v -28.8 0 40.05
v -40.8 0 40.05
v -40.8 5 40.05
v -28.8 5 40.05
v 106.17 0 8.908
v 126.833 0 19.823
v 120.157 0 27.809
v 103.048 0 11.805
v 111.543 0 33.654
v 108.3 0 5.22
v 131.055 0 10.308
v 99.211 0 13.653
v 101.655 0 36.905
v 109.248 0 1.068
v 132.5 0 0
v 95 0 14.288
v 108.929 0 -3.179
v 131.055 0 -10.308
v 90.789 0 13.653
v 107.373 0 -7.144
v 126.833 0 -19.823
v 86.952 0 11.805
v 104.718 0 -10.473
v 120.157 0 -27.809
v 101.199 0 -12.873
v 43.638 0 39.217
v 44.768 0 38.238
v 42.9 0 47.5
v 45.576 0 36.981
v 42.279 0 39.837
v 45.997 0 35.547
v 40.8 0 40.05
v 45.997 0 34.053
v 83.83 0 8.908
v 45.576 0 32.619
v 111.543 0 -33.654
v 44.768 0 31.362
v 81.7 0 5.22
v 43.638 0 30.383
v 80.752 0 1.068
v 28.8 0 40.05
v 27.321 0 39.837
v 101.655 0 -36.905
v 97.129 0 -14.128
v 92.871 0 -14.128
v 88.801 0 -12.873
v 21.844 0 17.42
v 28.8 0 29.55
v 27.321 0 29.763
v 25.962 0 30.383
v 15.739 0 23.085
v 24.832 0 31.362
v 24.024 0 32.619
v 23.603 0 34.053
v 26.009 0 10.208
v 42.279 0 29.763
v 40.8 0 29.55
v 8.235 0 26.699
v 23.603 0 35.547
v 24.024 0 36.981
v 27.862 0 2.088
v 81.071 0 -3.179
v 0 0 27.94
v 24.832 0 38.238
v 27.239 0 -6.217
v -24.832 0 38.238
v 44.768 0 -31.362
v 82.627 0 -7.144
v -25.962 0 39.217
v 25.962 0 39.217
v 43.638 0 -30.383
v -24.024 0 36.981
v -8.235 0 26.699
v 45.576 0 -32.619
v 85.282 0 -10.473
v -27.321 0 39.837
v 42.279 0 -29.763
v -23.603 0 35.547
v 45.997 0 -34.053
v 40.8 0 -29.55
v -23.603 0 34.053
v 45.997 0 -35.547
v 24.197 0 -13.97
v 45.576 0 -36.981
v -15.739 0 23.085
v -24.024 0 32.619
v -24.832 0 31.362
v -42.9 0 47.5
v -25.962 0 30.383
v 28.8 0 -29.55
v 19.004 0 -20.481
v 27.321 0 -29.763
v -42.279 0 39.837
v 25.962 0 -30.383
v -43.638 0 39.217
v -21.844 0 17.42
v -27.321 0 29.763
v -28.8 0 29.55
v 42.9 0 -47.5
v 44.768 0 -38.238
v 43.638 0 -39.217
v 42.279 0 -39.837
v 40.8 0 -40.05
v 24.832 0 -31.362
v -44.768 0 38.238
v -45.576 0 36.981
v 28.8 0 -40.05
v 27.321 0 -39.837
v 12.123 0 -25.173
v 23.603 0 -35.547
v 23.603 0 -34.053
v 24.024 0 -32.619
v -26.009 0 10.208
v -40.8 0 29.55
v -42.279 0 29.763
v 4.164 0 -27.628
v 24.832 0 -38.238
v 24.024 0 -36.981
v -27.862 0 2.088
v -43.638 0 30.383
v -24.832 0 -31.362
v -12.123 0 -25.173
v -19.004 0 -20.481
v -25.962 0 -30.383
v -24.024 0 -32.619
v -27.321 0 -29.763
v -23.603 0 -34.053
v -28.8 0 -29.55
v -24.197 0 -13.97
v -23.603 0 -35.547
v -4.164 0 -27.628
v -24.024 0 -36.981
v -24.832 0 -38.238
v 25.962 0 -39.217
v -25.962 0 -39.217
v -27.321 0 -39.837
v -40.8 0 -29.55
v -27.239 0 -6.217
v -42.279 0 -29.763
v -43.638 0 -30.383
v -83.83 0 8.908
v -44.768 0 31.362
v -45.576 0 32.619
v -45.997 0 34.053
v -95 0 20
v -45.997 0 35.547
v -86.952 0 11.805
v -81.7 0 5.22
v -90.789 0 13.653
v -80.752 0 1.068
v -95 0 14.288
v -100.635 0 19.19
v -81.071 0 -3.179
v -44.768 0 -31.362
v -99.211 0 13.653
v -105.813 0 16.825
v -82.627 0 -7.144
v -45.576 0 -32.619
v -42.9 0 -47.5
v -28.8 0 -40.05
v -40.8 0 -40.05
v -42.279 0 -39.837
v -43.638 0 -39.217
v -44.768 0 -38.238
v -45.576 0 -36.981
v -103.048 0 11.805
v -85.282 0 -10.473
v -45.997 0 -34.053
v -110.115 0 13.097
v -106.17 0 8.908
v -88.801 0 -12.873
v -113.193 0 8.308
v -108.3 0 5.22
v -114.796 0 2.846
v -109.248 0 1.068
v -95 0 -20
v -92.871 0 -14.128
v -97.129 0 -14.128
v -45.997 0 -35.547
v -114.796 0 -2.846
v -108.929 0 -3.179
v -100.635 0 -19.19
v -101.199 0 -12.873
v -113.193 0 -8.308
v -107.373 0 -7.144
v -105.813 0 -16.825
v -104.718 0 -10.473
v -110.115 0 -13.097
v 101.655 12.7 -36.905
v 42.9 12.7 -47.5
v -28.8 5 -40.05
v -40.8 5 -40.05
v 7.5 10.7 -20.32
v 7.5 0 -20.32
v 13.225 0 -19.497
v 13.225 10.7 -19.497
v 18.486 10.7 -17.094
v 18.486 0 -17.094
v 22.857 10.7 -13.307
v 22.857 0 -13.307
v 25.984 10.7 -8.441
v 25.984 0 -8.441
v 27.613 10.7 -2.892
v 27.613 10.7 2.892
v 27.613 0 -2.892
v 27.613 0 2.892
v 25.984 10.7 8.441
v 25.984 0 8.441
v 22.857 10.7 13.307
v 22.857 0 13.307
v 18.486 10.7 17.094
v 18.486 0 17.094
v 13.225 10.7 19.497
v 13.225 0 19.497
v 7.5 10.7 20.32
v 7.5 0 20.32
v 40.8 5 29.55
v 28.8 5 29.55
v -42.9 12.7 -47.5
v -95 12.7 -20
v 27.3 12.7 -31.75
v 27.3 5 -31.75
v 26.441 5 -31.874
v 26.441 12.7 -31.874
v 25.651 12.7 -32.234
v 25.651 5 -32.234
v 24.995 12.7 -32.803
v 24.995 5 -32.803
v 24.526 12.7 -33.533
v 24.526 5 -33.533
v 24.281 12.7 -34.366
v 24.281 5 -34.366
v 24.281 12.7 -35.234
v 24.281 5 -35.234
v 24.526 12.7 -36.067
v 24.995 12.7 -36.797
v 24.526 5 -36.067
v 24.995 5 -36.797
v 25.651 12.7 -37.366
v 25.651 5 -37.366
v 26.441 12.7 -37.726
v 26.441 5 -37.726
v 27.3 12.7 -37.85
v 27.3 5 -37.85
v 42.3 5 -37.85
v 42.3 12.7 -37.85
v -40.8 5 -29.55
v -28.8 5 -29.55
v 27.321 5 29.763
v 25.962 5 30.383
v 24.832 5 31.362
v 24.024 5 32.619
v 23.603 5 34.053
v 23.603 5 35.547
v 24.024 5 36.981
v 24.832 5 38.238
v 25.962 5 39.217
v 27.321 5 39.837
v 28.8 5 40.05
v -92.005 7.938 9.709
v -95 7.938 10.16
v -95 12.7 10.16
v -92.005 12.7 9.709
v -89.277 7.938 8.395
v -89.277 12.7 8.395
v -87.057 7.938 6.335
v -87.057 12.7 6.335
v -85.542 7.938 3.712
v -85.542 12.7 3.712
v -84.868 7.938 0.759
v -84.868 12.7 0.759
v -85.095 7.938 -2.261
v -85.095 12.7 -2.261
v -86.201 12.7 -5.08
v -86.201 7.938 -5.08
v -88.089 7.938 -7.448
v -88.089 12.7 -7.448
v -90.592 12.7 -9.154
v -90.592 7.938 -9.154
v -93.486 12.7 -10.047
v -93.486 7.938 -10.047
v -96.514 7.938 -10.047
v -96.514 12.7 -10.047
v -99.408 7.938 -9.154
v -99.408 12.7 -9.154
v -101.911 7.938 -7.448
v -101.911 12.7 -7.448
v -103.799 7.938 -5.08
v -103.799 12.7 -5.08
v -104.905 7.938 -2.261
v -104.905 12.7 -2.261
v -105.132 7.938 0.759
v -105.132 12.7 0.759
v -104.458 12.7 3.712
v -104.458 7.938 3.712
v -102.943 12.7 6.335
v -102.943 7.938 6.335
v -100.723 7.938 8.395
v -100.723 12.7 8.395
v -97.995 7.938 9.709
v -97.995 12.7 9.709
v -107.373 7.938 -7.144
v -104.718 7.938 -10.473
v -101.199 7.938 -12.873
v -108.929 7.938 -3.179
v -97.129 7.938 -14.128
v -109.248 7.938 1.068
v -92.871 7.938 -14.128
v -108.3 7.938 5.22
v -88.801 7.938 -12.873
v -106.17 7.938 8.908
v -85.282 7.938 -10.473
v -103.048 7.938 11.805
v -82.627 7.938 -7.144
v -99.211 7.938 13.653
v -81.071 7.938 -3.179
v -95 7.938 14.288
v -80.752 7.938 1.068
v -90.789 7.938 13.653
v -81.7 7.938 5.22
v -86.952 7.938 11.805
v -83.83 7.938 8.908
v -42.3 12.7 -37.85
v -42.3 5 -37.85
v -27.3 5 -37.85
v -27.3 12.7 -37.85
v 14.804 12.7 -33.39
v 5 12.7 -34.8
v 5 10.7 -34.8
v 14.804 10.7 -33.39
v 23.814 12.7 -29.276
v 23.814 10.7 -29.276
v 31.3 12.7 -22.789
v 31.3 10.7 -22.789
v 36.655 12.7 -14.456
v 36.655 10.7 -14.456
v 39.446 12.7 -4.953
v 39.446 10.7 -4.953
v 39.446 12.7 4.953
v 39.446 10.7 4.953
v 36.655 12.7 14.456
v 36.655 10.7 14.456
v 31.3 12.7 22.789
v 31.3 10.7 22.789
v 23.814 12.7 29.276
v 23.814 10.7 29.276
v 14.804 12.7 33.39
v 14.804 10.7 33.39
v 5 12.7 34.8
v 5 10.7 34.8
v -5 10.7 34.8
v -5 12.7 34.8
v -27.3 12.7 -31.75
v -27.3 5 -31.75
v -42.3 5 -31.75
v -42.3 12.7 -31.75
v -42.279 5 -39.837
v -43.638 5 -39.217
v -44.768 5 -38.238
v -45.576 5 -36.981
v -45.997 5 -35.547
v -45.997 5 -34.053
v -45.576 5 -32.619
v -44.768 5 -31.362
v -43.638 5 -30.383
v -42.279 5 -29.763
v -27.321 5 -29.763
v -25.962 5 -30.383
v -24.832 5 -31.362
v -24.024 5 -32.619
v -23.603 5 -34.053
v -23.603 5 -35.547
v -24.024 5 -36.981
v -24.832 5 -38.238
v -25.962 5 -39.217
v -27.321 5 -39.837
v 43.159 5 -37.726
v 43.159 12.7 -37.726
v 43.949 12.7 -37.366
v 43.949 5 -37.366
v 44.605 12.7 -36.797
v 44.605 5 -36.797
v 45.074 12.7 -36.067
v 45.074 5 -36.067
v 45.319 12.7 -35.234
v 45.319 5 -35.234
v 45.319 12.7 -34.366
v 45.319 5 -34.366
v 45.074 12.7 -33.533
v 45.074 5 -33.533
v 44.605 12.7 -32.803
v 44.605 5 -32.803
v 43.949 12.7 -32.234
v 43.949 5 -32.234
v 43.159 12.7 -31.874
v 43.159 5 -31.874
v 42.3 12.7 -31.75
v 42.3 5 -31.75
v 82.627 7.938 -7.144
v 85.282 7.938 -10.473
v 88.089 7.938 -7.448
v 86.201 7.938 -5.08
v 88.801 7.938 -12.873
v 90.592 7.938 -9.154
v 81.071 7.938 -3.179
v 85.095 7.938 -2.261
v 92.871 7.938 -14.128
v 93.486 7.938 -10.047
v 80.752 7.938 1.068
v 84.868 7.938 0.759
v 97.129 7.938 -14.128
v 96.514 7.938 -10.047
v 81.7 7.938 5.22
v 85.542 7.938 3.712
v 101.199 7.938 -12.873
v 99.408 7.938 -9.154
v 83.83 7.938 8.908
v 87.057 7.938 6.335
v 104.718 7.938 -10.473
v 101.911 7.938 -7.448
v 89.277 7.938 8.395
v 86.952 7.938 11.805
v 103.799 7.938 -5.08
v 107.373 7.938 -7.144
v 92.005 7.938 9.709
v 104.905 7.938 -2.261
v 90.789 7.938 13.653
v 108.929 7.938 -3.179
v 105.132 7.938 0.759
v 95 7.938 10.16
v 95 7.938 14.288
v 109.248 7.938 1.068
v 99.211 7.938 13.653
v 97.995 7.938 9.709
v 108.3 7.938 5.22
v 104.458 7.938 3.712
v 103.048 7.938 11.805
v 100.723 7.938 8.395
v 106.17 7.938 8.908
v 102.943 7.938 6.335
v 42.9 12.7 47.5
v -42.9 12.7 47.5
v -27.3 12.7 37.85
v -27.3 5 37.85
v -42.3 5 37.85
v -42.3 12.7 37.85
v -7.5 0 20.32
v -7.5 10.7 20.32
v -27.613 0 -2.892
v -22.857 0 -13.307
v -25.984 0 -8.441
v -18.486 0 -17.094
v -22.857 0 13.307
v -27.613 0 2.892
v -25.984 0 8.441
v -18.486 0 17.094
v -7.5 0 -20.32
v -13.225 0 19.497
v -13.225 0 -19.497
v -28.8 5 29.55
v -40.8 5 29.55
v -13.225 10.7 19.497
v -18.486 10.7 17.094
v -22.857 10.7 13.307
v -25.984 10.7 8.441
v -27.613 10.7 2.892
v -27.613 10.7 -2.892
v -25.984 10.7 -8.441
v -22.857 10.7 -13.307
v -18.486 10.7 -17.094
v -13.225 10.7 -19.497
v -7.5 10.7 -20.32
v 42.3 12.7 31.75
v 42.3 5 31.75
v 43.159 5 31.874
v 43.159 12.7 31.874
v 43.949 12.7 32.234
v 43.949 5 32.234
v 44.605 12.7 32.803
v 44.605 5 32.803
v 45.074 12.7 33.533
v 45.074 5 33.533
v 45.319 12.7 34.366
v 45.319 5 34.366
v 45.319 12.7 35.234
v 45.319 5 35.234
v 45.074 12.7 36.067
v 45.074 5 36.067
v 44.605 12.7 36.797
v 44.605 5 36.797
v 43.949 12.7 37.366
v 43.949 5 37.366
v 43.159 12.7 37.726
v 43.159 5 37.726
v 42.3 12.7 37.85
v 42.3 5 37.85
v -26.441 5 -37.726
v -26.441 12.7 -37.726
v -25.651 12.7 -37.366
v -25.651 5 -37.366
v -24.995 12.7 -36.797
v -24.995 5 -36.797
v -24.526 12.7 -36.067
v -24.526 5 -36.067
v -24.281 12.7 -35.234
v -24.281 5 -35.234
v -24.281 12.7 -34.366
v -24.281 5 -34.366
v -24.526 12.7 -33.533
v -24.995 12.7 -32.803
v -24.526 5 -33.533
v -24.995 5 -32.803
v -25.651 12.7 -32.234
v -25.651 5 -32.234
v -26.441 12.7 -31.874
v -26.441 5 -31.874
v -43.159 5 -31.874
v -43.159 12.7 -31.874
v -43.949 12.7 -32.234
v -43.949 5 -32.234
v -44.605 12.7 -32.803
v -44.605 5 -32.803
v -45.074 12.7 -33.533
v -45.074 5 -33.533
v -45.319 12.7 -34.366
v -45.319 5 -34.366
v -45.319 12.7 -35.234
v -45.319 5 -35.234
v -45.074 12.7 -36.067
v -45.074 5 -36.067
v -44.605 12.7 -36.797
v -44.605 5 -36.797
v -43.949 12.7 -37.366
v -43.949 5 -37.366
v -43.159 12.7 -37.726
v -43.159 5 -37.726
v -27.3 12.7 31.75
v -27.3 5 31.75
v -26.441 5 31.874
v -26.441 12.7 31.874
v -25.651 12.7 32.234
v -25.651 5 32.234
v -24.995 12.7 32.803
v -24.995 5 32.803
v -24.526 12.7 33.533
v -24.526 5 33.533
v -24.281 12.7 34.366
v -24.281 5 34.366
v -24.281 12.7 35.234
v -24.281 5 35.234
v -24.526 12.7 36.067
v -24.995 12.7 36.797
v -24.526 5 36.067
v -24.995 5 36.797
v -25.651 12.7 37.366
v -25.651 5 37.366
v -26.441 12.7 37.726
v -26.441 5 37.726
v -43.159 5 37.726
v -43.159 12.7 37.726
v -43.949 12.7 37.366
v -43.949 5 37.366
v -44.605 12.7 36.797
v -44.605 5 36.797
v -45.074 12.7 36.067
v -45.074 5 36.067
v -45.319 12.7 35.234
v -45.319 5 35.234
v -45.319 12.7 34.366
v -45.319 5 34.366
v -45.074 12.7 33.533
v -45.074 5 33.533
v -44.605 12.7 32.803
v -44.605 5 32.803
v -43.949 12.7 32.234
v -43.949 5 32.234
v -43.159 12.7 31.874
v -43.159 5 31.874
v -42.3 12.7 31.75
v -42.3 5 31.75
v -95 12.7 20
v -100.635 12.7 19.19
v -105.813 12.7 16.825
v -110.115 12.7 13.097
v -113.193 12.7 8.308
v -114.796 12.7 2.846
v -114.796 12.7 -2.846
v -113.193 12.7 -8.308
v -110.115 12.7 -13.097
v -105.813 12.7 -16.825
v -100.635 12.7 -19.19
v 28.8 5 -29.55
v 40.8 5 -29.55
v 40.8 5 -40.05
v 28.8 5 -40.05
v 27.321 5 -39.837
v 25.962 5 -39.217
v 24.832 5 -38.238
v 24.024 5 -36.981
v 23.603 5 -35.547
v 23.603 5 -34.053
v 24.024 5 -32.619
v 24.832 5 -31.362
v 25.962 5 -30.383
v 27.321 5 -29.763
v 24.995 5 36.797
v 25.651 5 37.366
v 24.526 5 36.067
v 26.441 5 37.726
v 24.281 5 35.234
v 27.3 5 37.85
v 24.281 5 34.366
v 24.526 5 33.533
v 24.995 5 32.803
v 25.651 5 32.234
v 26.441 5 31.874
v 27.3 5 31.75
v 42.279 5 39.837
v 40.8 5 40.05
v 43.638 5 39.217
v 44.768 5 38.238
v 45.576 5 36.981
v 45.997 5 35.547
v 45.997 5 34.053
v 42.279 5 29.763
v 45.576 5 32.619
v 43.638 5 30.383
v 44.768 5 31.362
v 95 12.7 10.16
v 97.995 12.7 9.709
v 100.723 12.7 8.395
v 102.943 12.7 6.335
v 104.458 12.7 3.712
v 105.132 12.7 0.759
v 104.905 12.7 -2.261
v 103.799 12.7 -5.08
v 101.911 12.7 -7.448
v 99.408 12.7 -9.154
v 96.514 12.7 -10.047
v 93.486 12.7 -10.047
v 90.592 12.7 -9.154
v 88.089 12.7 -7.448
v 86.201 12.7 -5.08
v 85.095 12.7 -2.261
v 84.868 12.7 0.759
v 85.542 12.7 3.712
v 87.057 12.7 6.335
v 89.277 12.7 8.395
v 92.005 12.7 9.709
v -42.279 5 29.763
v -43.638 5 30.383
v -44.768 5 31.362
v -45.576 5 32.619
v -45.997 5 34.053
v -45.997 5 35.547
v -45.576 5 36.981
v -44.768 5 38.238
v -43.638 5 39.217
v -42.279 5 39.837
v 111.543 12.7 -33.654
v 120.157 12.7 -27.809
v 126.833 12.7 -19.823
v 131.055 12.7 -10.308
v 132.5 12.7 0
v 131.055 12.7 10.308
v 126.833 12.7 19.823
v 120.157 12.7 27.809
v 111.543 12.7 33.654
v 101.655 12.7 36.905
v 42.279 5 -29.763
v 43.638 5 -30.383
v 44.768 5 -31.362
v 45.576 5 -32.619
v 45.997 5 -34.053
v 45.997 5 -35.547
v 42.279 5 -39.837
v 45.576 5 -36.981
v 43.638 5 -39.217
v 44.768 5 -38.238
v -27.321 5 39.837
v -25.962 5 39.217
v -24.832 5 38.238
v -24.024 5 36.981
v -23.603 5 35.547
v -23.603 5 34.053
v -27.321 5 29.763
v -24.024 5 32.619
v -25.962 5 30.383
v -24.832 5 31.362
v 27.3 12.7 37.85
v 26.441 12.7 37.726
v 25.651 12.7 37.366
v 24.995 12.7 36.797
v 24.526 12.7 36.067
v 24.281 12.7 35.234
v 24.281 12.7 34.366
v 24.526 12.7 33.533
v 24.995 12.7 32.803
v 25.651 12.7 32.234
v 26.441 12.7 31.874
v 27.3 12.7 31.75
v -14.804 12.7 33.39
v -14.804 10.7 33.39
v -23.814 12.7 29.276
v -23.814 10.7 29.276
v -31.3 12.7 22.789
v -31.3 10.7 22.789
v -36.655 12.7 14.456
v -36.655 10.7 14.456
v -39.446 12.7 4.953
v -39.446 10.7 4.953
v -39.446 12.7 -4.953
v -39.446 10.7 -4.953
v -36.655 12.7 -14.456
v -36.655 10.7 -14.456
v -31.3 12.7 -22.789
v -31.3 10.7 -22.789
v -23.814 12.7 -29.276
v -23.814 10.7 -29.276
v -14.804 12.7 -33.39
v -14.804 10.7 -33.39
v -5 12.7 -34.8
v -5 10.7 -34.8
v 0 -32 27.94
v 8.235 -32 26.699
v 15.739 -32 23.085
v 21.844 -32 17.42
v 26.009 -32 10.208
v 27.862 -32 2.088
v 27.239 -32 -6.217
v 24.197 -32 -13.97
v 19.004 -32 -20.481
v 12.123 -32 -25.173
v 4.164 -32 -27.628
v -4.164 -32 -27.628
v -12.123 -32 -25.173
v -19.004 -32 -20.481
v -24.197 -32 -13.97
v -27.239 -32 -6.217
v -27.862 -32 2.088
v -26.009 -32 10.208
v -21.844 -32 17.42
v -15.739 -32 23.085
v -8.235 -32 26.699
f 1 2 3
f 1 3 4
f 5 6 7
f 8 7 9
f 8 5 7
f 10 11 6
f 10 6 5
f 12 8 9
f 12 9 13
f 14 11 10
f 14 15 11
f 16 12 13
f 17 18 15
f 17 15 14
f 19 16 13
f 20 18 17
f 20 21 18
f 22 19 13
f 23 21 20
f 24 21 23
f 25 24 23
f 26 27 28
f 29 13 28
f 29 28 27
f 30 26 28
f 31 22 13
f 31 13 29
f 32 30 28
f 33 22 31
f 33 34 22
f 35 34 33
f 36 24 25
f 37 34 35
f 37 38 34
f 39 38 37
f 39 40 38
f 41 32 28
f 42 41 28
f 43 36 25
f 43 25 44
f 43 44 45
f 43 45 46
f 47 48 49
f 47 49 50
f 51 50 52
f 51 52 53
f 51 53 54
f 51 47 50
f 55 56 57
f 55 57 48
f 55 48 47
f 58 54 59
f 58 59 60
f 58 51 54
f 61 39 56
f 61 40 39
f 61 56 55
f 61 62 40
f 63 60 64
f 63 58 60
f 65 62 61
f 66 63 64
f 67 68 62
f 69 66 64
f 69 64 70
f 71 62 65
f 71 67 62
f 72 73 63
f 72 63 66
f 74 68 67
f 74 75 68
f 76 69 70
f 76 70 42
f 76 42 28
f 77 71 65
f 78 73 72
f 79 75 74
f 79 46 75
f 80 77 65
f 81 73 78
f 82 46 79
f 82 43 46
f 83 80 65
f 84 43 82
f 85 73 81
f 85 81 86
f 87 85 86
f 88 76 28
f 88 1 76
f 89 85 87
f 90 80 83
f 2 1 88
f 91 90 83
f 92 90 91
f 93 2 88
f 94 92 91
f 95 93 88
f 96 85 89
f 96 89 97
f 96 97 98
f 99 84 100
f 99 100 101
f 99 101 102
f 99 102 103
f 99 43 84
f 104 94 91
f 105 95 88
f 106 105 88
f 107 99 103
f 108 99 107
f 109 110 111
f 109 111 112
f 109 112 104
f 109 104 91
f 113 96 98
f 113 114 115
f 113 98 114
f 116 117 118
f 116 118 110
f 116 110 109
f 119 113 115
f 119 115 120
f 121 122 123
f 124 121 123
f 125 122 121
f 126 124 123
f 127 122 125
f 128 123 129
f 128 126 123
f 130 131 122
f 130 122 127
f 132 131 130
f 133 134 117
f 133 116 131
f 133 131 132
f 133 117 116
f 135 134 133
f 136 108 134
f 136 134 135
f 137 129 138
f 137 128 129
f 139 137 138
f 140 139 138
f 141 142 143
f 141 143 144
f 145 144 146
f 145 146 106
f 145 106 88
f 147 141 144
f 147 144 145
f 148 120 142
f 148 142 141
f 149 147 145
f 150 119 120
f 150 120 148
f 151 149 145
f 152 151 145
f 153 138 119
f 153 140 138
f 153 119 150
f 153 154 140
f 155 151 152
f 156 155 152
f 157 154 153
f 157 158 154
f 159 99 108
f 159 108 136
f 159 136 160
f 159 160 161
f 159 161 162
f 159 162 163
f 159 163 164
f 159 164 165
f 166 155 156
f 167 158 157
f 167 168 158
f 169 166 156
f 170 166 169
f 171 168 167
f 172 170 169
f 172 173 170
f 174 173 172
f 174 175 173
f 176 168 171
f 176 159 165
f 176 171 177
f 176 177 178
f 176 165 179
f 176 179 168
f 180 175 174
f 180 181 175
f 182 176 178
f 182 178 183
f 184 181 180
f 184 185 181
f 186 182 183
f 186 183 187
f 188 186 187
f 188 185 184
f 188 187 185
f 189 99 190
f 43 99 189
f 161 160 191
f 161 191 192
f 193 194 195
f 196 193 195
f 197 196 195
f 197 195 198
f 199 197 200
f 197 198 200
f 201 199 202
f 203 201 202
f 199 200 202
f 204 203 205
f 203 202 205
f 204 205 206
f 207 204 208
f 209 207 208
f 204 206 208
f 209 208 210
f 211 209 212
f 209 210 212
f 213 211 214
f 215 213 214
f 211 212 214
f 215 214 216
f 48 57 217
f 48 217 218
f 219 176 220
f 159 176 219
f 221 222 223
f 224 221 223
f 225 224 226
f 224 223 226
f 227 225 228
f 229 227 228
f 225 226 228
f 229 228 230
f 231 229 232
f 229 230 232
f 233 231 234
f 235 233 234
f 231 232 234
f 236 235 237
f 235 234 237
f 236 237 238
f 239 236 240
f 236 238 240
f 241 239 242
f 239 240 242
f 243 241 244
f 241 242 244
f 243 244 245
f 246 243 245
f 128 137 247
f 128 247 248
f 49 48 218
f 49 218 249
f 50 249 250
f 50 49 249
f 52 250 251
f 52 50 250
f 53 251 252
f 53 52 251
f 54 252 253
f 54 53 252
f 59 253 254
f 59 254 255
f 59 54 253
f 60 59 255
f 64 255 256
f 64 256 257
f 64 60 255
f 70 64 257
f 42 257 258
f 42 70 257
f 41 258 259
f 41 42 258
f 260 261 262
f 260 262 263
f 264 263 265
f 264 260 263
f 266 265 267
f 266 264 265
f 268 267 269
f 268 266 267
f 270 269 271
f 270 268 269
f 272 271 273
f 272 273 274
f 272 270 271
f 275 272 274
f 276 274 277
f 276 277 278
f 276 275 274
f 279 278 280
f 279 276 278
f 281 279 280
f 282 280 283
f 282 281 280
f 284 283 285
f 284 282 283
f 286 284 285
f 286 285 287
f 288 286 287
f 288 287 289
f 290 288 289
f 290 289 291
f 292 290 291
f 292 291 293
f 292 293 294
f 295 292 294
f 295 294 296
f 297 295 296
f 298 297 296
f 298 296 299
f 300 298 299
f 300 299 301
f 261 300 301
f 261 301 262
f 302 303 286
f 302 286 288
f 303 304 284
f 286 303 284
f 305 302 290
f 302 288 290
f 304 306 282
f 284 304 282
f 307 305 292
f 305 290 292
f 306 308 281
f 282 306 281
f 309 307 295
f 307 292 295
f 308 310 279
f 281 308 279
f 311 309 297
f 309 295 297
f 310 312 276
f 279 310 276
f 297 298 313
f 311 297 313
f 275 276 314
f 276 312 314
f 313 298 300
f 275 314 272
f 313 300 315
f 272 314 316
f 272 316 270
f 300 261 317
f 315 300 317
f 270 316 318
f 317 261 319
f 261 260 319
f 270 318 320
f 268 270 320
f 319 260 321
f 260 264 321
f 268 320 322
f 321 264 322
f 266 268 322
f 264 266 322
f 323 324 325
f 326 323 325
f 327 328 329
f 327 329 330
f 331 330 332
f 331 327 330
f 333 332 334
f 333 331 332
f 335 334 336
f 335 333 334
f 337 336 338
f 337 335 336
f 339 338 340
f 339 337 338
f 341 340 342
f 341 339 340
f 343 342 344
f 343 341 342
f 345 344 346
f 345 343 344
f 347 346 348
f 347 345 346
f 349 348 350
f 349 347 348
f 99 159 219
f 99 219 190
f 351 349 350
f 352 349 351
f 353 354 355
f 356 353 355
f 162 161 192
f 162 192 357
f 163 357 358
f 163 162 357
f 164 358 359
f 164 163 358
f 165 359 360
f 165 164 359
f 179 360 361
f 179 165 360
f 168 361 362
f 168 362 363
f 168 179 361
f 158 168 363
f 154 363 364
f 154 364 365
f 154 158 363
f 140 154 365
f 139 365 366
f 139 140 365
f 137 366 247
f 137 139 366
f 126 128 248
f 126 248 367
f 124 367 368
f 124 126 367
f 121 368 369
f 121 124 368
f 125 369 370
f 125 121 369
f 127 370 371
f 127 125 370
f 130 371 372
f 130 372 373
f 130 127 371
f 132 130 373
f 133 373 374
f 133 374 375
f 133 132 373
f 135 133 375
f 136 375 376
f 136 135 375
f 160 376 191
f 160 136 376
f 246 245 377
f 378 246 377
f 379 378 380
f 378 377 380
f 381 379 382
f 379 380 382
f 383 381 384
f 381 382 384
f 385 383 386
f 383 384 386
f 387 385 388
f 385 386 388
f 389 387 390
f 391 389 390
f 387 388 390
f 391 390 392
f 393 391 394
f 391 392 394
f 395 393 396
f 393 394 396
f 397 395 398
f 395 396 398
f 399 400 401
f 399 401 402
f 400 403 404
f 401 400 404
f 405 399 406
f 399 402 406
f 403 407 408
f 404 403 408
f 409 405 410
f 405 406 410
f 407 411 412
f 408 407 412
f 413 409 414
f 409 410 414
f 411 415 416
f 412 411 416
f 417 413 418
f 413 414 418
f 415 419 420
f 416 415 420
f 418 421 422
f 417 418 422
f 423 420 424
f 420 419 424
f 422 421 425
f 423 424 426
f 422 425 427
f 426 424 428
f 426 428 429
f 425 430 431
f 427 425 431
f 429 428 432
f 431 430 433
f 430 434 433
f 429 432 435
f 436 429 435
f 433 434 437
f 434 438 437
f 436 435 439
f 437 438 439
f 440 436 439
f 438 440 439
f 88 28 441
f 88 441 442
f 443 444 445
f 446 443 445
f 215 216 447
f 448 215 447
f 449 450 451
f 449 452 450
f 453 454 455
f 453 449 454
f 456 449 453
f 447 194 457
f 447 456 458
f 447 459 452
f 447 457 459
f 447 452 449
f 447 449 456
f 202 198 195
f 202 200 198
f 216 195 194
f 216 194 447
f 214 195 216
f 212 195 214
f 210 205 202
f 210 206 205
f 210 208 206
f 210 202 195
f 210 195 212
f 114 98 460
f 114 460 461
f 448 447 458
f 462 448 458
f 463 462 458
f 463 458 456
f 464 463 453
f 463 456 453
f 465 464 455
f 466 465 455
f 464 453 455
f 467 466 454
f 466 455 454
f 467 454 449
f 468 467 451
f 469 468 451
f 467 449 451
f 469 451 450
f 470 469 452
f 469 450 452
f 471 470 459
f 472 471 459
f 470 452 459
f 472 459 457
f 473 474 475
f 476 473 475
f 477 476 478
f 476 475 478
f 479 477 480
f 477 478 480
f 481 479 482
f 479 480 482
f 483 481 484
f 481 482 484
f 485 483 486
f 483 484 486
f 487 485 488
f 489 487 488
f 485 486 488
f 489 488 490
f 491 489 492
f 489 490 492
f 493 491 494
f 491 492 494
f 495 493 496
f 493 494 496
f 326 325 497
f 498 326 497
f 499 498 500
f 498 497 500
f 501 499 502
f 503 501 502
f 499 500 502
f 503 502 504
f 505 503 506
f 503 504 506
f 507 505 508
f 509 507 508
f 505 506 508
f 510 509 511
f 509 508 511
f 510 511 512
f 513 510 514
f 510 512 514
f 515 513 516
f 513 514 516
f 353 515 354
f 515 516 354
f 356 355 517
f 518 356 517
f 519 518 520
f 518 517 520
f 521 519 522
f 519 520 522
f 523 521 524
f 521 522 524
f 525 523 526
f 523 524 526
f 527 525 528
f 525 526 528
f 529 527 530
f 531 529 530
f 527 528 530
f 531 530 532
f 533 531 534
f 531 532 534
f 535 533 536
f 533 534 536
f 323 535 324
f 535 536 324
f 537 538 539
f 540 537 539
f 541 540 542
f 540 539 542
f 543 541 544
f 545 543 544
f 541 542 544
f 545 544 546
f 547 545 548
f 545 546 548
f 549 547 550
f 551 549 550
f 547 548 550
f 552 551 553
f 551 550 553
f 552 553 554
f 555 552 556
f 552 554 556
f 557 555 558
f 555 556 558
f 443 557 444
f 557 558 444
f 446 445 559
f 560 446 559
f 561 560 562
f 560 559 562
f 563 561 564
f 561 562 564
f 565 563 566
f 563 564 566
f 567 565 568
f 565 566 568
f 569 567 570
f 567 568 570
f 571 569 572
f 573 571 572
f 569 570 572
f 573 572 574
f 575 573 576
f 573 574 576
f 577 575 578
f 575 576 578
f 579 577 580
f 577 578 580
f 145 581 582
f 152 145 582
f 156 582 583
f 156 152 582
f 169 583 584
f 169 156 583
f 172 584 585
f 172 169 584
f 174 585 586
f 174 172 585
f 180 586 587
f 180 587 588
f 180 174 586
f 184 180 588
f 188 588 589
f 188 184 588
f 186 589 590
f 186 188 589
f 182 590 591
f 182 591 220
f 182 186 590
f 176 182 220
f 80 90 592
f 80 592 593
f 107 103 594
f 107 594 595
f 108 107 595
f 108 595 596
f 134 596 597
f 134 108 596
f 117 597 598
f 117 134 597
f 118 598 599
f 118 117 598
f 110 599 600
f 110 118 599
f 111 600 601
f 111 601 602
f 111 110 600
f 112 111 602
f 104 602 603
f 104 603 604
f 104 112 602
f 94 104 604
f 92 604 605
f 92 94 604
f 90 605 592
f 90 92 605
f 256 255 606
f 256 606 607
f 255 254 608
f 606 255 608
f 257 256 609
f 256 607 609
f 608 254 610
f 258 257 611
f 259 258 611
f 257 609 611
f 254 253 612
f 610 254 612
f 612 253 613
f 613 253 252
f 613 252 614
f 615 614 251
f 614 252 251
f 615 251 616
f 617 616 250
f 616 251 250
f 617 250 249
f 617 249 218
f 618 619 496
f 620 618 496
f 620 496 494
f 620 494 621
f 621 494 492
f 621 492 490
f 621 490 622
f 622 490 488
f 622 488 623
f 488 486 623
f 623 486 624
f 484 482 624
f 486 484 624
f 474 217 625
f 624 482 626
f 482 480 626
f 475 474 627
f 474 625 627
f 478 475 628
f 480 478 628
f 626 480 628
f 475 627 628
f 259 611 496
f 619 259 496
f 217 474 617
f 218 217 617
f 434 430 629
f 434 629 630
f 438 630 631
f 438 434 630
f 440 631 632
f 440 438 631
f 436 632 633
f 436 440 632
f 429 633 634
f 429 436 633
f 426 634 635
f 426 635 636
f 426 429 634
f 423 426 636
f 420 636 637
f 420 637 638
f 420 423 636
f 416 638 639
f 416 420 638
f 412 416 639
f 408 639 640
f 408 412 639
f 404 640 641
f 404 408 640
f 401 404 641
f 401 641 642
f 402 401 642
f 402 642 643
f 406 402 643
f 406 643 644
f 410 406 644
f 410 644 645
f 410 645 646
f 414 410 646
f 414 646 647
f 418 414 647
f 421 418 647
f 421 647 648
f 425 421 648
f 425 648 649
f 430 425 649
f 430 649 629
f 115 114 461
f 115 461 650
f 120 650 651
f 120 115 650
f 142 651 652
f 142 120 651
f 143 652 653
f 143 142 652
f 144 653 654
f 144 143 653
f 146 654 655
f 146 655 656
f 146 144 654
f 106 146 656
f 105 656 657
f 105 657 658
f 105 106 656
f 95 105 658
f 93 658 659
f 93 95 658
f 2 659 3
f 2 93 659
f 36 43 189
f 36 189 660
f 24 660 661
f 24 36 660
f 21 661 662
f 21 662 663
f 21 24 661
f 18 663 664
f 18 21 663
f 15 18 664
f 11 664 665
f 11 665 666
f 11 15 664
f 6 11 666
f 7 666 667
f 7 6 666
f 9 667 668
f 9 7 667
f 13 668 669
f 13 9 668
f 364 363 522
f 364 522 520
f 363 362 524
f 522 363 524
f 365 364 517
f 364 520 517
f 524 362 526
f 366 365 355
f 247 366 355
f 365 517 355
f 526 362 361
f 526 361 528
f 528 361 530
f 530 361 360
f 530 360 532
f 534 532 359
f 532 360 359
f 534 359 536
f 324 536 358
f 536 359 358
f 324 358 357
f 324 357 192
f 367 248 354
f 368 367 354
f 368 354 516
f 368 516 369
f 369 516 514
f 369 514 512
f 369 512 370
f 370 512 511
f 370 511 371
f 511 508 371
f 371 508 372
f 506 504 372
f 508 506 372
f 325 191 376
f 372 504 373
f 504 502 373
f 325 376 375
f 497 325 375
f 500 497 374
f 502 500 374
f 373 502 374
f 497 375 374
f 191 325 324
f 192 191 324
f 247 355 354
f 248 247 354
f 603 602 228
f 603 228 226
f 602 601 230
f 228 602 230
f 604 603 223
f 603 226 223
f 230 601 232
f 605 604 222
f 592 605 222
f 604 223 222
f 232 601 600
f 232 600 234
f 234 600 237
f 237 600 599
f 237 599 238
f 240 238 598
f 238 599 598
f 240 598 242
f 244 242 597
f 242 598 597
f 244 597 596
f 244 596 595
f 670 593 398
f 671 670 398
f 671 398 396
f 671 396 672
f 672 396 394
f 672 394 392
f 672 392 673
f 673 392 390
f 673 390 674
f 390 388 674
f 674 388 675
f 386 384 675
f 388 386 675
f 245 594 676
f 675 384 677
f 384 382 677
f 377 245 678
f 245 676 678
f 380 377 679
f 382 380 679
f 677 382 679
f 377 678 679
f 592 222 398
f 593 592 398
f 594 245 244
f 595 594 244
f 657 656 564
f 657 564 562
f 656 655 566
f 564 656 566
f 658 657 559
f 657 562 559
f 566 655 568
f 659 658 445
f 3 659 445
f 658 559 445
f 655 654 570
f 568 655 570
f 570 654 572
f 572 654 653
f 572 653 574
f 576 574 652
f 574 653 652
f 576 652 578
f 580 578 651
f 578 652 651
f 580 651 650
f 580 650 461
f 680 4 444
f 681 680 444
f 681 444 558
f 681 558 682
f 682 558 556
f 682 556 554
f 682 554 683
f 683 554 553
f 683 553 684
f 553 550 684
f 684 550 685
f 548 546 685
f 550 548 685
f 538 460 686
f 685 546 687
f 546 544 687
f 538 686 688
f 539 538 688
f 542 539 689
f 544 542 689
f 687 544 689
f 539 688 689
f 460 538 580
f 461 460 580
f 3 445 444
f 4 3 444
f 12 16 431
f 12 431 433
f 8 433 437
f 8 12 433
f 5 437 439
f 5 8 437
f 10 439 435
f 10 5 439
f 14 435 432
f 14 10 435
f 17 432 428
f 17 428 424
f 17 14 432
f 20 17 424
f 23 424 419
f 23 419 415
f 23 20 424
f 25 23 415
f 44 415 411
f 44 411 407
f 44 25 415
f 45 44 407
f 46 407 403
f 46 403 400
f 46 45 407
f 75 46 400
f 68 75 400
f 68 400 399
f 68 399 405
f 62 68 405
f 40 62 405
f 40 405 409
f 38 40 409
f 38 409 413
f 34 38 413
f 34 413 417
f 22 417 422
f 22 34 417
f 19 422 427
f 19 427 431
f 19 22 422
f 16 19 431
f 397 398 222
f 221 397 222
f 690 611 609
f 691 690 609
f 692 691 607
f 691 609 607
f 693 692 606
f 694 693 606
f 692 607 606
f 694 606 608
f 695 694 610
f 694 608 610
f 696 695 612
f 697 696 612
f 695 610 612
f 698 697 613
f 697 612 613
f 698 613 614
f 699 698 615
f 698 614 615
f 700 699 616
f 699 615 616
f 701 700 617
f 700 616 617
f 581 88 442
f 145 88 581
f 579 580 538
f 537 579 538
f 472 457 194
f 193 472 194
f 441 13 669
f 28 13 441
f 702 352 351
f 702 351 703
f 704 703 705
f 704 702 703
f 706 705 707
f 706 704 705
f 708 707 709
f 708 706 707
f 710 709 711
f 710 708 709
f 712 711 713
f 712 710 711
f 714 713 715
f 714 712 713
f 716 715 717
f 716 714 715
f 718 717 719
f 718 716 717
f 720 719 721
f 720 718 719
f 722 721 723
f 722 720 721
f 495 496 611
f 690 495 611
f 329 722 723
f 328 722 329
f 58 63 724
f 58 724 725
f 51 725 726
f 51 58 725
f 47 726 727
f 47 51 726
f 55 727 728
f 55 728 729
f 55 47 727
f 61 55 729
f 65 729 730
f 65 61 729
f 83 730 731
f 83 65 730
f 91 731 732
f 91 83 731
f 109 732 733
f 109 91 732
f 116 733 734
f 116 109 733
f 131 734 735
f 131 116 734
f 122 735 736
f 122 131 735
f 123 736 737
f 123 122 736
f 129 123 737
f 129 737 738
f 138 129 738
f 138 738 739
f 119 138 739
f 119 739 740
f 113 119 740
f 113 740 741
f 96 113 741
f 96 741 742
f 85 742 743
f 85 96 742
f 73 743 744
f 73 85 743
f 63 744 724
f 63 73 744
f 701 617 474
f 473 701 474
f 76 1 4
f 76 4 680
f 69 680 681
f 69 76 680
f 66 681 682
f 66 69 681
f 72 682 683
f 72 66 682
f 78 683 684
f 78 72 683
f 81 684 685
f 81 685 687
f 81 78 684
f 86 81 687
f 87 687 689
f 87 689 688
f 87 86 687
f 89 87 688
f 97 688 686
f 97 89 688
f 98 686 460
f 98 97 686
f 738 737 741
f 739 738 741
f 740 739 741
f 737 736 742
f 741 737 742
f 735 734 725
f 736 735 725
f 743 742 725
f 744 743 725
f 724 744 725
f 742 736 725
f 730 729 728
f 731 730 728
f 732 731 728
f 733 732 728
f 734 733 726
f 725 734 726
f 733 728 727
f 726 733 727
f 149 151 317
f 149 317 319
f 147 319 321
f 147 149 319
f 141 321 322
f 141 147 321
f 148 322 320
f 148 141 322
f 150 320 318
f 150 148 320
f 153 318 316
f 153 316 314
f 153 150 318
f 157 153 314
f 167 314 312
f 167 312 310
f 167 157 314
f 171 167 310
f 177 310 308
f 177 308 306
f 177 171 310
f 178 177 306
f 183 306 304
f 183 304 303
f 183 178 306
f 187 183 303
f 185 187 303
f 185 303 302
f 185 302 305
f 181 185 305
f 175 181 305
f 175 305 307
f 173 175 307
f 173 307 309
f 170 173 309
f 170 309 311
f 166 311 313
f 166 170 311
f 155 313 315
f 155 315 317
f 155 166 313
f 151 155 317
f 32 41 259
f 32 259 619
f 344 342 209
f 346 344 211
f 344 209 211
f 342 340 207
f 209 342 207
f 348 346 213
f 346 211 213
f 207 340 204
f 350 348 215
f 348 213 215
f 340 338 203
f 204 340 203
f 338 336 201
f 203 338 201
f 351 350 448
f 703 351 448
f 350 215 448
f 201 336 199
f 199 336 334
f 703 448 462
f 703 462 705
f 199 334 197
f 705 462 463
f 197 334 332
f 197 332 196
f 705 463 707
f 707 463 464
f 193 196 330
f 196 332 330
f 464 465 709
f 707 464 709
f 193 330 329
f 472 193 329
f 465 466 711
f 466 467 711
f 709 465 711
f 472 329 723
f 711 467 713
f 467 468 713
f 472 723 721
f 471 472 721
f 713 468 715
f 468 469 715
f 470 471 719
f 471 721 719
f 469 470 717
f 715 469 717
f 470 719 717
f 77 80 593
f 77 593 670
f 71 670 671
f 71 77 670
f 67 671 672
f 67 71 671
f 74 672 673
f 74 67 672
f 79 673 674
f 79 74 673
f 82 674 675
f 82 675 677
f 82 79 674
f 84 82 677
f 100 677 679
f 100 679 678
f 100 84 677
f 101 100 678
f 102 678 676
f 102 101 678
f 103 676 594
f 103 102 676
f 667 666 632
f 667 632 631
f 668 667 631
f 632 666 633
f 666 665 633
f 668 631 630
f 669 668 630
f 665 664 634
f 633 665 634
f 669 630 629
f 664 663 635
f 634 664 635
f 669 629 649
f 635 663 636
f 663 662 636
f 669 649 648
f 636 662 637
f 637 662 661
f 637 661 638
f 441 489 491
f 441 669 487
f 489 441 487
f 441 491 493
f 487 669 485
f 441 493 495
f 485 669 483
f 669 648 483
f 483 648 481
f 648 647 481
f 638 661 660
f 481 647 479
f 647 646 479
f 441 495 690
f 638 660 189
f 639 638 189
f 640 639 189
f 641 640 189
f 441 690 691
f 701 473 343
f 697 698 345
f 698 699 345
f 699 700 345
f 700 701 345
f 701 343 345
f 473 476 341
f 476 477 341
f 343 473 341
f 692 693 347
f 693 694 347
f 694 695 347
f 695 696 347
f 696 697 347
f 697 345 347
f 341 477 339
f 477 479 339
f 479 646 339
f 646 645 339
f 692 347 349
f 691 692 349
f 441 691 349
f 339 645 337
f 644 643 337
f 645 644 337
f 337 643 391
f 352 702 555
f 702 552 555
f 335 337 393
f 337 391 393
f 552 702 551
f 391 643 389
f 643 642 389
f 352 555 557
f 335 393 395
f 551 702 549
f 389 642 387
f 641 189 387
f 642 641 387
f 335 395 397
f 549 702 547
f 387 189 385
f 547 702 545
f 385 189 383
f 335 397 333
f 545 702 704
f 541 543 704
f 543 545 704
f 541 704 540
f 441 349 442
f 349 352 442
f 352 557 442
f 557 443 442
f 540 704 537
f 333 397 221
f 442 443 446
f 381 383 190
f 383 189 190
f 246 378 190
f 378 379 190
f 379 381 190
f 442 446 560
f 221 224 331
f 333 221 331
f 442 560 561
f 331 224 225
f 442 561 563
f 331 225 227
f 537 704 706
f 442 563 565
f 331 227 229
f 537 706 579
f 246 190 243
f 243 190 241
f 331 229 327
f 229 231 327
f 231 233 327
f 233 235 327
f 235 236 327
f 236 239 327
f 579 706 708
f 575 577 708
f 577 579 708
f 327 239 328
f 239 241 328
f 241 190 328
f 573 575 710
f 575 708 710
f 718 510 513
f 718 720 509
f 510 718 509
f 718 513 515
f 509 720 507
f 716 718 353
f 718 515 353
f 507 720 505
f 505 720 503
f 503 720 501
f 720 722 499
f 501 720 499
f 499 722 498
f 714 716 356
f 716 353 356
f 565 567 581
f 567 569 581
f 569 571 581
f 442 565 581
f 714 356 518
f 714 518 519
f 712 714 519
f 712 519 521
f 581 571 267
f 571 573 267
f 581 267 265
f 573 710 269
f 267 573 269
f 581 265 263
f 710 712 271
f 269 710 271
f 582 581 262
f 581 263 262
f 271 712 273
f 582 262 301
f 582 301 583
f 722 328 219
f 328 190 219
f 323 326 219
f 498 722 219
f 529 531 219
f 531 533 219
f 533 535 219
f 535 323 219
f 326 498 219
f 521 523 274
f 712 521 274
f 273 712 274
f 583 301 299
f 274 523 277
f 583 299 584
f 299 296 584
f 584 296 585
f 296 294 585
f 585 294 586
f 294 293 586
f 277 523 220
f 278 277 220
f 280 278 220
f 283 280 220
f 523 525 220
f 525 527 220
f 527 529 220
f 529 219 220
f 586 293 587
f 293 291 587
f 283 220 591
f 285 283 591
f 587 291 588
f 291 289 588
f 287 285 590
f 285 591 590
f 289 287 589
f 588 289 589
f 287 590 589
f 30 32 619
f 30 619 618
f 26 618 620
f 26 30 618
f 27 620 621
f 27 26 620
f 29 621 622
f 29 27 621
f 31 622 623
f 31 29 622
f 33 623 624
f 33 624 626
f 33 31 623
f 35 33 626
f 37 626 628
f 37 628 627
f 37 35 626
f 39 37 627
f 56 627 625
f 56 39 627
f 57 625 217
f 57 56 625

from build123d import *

# Parameters (mm, degrees)
SKETCH1_R               = 10.16
BOSS_EXTRUDE1_DEPTH     = 12.7
SKETCH2_R               = 14.2875
CUT_EXTRUDE1_DEPTH      = 7.9375
CUT_EXTRUDE2_DEPTH      = 5
CUT_EXTRUDE3_START      = 12.7
CUT_EXTRUDE3_DEPTH      = 2
CUT_EXTRUDE4_DEPTH      = 22
CUT_EXTRUDE4_DEPTH_BACK = 12
SKETCH6_R               = 27.94
BOSS_EXTRUDE2_DEPTH     = 32


with BuildPart() as part:
    # Sketch1 → Boss-Extrude1 (new body)
    with BuildSketch(Plane(origin=(0, 0, 0), x_dir=(1, 0, 0), z_dir=(0, 1, 0))):
        with BuildLine():
            Line((-42.9, 47.5), (42.9, 47.5))
            Line((42.9, 47.5), (101.65500633, 36.904754311))
            ThreePointArc((101.65500633, 36.904754311), (132.5, 0), (101.65500633, -36.904754311))
            Line((101.65500633, -36.904754311), (42.9, -47.5))
            Line((42.9, -47.5), (-42.9, -47.5))
            Line((-42.9, -47.5), (-95, -20))
            ThreePointArc((-95, -20), (-115, 0), (-95, 20))
            Line((-95, 20), (-42.9, 47.5))
        make_face()
        with Locations(Location((-95, 0, 0), (0, 0, 270))):
            Circle(SKETCH1_R, mode=Mode.SUBTRACT)
        with Locations(Location((95, 0, 0), (0, 0, 270))):
            Circle(SKETCH1_R, mode=Mode.SUBTRACT)
        with BuildLine():
            Line((-42.3, 37.85), (-27.3, 37.85))
            ThreePointArc((-27.3, 37.85), (-24.25, 34.8), (-27.3, 31.75))
            Line((-27.3, 31.75), (-42.3, 31.75))
            ThreePointArc((-42.3, 31.75), (-45.35, 34.8), (-42.3, 37.85))
        make_face(mode=Mode.SUBTRACT)
        with BuildLine():
            Line((42.3, 31.75), (27.3, 31.75))
            ThreePointArc((27.3, 31.75), (24.25, 34.8), (27.3, 37.85))
            Line((27.3, 37.85), (42.3, 37.85))
            ThreePointArc((42.3, 37.85), (45.35, 34.8), (42.3, 31.75))
        make_face(mode=Mode.SUBTRACT)
        with BuildLine():
            Line((42.3, -37.85), (27.3, -37.85))
            ThreePointArc((27.3, -37.85), (24.25, -34.8), (27.3, -31.75))
            Line((27.3, -31.75), (42.3, -31.75))
            ThreePointArc((42.3, -31.75), (45.35, -34.8), (42.3, -37.85))
        make_face(mode=Mode.SUBTRACT)
        with BuildLine():
            Line((-42.3, -31.75), (-27.3, -31.75))
            ThreePointArc((-27.3, -31.75), (-24.25, -34.8), (-27.3, -37.85))
            Line((-27.3, -37.85), (-42.3, -37.85))
            ThreePointArc((-42.3, -37.85), (-45.35, -34.8), (-42.3, -31.75))
        make_face(mode=Mode.SUBTRACT)
        with BuildLine():
            Line((-8, 7.5), (8, 7.5))
            ThreePointArc((8, 7.5), (15.5, 0), (8, -7.5))
            Line((8, -7.5), (-8, -7.5))
            ThreePointArc((-8, -7.5), (-15.5, 0), (-8, 7.5))
        make_face(mode=Mode.SUBTRACT)
    extrude(amount=BOSS_EXTRUDE1_DEPTH)

    # Sketch2 → Cut-Extrude1 (cut)
    with BuildSketch(Plane(origin=(0, 0, 0), x_dir=(1, 0, 0), z_dir=(0, 1, 0))):
        with Locations(Location((-95, 0, 0), (0, 0, 270))):
            Circle(SKETCH2_R)
        with Locations(Location((95, 0, 0), (0, 0, 270))):
            Circle(SKETCH2_R)
    extrude(amount=CUT_EXTRUDE1_DEPTH, mode=Mode.SUBTRACT)

    # Sketch3 → Cut-Extrude2 (cut)
    with BuildSketch(Plane(origin=(0, 0, 0), x_dir=(1, 0, 0), z_dir=(0, 1, 0))):
        with BuildLine():
            Line((-40.8, -40.05), (-28.8, -40.05))
            ThreePointArc((-28.8, -40.05), (-23.55, -34.8), (-28.8, -29.55))
            Line((-28.8, -29.55), (-40.8, -29.55))
            ThreePointArc((-40.8, -29.55), (-46.05, -34.8), (-40.8, -40.05))
        make_face()
        with BuildLine():
            Line((40.8, -29.55), (28.8, -29.55))
            ThreePointArc((28.8, -29.55), (23.55, -34.8), (28.8, -40.05))
            Line((28.8, -40.05), (40.8, -40.05))
            ThreePointArc((40.8, -40.05), (46.05, -34.8), (40.8, -29.55))
        make_face()
        with BuildLine():
            Line((40.8, 40.05), (28.8, 40.05))
            ThreePointArc((28.8, 40.05), (23.55, 34.8), (28.8, 29.55))
            Line((28.8, 29.55), (40.8, 29.55))
            ThreePointArc((40.8, 29.55), (46.05, 34.8), (40.8, 40.05))
        make_face()
        with BuildLine():
            ThreePointArc((-28.8, 29.55), (-23.55, 34.8), (-28.8, 40.05))
            Line((-28.8, 40.05), (-40.8, 40.05))
            ThreePointArc((-40.8, 40.05), (-46.05, 34.8), (-40.8, 29.55))
            Line((-40.8, 29.55), (-28.8, 29.55))
        make_face()
    extrude(amount=CUT_EXTRUDE2_DEPTH, mode=Mode.SUBTRACT)

    # Sketch4 → Cut-Extrude3 (cut)
    with BuildSketch(Plane(origin=(0, 0, 0), x_dir=(1, 0, 0), z_dir=(0, 1, 0)).offset(CUT_EXTRUDE3_START)):
        with BuildLine():
            Line((-5, 34.8), (5, 34.8))
            ThreePointArc((5, 34.8), (39.8, 0), (5, -34.8))
            Line((5, -34.8), (-5, -34.8))
            ThreePointArc((-5, -34.8), (-39.8, 0), (-5, 34.8))
        make_face()
    extrude(amount=-CUT_EXTRUDE3_DEPTH, mode=Mode.SUBTRACT)

    # Sketch5 → Cut-Extrude4 (cut, two sides: drawn at the far end of the back side and taken through both)
    with BuildSketch(Plane(origin=(0, 0, 0), x_dir=(1, 0, 0), z_dir=(0, 1, 0)).offset(-CUT_EXTRUDE4_DEPTH_BACK)):
        with BuildLine():
            Line((-7.5, 20.32), (7.5, 20.32))
            ThreePointArc((7.5, 20.32), (27.82, 0), (7.5, -20.32))
            Line((7.5, -20.32), (-7.5, -20.32))
            ThreePointArc((-7.5, -20.32), (-27.82, 0), (-7.5, 20.32))
        make_face()
    extrude(amount=CUT_EXTRUDE4_DEPTH + CUT_EXTRUDE4_DEPTH_BACK, mode=Mode.SUBTRACT)

    # Sketch6 → Boss-Extrude2 (add)
    with BuildSketch(Plane(origin=(0, 0, 0), x_dir=(1, 0, 0), z_dir=(0, 1, 0))):
        with Locations(Location((0, 0, 0), (0, 0, 270))):
            Circle(SKETCH6_R)
    extrude(amount=-BOSS_EXTRUDE2_DEPTH)


solid = part.part
